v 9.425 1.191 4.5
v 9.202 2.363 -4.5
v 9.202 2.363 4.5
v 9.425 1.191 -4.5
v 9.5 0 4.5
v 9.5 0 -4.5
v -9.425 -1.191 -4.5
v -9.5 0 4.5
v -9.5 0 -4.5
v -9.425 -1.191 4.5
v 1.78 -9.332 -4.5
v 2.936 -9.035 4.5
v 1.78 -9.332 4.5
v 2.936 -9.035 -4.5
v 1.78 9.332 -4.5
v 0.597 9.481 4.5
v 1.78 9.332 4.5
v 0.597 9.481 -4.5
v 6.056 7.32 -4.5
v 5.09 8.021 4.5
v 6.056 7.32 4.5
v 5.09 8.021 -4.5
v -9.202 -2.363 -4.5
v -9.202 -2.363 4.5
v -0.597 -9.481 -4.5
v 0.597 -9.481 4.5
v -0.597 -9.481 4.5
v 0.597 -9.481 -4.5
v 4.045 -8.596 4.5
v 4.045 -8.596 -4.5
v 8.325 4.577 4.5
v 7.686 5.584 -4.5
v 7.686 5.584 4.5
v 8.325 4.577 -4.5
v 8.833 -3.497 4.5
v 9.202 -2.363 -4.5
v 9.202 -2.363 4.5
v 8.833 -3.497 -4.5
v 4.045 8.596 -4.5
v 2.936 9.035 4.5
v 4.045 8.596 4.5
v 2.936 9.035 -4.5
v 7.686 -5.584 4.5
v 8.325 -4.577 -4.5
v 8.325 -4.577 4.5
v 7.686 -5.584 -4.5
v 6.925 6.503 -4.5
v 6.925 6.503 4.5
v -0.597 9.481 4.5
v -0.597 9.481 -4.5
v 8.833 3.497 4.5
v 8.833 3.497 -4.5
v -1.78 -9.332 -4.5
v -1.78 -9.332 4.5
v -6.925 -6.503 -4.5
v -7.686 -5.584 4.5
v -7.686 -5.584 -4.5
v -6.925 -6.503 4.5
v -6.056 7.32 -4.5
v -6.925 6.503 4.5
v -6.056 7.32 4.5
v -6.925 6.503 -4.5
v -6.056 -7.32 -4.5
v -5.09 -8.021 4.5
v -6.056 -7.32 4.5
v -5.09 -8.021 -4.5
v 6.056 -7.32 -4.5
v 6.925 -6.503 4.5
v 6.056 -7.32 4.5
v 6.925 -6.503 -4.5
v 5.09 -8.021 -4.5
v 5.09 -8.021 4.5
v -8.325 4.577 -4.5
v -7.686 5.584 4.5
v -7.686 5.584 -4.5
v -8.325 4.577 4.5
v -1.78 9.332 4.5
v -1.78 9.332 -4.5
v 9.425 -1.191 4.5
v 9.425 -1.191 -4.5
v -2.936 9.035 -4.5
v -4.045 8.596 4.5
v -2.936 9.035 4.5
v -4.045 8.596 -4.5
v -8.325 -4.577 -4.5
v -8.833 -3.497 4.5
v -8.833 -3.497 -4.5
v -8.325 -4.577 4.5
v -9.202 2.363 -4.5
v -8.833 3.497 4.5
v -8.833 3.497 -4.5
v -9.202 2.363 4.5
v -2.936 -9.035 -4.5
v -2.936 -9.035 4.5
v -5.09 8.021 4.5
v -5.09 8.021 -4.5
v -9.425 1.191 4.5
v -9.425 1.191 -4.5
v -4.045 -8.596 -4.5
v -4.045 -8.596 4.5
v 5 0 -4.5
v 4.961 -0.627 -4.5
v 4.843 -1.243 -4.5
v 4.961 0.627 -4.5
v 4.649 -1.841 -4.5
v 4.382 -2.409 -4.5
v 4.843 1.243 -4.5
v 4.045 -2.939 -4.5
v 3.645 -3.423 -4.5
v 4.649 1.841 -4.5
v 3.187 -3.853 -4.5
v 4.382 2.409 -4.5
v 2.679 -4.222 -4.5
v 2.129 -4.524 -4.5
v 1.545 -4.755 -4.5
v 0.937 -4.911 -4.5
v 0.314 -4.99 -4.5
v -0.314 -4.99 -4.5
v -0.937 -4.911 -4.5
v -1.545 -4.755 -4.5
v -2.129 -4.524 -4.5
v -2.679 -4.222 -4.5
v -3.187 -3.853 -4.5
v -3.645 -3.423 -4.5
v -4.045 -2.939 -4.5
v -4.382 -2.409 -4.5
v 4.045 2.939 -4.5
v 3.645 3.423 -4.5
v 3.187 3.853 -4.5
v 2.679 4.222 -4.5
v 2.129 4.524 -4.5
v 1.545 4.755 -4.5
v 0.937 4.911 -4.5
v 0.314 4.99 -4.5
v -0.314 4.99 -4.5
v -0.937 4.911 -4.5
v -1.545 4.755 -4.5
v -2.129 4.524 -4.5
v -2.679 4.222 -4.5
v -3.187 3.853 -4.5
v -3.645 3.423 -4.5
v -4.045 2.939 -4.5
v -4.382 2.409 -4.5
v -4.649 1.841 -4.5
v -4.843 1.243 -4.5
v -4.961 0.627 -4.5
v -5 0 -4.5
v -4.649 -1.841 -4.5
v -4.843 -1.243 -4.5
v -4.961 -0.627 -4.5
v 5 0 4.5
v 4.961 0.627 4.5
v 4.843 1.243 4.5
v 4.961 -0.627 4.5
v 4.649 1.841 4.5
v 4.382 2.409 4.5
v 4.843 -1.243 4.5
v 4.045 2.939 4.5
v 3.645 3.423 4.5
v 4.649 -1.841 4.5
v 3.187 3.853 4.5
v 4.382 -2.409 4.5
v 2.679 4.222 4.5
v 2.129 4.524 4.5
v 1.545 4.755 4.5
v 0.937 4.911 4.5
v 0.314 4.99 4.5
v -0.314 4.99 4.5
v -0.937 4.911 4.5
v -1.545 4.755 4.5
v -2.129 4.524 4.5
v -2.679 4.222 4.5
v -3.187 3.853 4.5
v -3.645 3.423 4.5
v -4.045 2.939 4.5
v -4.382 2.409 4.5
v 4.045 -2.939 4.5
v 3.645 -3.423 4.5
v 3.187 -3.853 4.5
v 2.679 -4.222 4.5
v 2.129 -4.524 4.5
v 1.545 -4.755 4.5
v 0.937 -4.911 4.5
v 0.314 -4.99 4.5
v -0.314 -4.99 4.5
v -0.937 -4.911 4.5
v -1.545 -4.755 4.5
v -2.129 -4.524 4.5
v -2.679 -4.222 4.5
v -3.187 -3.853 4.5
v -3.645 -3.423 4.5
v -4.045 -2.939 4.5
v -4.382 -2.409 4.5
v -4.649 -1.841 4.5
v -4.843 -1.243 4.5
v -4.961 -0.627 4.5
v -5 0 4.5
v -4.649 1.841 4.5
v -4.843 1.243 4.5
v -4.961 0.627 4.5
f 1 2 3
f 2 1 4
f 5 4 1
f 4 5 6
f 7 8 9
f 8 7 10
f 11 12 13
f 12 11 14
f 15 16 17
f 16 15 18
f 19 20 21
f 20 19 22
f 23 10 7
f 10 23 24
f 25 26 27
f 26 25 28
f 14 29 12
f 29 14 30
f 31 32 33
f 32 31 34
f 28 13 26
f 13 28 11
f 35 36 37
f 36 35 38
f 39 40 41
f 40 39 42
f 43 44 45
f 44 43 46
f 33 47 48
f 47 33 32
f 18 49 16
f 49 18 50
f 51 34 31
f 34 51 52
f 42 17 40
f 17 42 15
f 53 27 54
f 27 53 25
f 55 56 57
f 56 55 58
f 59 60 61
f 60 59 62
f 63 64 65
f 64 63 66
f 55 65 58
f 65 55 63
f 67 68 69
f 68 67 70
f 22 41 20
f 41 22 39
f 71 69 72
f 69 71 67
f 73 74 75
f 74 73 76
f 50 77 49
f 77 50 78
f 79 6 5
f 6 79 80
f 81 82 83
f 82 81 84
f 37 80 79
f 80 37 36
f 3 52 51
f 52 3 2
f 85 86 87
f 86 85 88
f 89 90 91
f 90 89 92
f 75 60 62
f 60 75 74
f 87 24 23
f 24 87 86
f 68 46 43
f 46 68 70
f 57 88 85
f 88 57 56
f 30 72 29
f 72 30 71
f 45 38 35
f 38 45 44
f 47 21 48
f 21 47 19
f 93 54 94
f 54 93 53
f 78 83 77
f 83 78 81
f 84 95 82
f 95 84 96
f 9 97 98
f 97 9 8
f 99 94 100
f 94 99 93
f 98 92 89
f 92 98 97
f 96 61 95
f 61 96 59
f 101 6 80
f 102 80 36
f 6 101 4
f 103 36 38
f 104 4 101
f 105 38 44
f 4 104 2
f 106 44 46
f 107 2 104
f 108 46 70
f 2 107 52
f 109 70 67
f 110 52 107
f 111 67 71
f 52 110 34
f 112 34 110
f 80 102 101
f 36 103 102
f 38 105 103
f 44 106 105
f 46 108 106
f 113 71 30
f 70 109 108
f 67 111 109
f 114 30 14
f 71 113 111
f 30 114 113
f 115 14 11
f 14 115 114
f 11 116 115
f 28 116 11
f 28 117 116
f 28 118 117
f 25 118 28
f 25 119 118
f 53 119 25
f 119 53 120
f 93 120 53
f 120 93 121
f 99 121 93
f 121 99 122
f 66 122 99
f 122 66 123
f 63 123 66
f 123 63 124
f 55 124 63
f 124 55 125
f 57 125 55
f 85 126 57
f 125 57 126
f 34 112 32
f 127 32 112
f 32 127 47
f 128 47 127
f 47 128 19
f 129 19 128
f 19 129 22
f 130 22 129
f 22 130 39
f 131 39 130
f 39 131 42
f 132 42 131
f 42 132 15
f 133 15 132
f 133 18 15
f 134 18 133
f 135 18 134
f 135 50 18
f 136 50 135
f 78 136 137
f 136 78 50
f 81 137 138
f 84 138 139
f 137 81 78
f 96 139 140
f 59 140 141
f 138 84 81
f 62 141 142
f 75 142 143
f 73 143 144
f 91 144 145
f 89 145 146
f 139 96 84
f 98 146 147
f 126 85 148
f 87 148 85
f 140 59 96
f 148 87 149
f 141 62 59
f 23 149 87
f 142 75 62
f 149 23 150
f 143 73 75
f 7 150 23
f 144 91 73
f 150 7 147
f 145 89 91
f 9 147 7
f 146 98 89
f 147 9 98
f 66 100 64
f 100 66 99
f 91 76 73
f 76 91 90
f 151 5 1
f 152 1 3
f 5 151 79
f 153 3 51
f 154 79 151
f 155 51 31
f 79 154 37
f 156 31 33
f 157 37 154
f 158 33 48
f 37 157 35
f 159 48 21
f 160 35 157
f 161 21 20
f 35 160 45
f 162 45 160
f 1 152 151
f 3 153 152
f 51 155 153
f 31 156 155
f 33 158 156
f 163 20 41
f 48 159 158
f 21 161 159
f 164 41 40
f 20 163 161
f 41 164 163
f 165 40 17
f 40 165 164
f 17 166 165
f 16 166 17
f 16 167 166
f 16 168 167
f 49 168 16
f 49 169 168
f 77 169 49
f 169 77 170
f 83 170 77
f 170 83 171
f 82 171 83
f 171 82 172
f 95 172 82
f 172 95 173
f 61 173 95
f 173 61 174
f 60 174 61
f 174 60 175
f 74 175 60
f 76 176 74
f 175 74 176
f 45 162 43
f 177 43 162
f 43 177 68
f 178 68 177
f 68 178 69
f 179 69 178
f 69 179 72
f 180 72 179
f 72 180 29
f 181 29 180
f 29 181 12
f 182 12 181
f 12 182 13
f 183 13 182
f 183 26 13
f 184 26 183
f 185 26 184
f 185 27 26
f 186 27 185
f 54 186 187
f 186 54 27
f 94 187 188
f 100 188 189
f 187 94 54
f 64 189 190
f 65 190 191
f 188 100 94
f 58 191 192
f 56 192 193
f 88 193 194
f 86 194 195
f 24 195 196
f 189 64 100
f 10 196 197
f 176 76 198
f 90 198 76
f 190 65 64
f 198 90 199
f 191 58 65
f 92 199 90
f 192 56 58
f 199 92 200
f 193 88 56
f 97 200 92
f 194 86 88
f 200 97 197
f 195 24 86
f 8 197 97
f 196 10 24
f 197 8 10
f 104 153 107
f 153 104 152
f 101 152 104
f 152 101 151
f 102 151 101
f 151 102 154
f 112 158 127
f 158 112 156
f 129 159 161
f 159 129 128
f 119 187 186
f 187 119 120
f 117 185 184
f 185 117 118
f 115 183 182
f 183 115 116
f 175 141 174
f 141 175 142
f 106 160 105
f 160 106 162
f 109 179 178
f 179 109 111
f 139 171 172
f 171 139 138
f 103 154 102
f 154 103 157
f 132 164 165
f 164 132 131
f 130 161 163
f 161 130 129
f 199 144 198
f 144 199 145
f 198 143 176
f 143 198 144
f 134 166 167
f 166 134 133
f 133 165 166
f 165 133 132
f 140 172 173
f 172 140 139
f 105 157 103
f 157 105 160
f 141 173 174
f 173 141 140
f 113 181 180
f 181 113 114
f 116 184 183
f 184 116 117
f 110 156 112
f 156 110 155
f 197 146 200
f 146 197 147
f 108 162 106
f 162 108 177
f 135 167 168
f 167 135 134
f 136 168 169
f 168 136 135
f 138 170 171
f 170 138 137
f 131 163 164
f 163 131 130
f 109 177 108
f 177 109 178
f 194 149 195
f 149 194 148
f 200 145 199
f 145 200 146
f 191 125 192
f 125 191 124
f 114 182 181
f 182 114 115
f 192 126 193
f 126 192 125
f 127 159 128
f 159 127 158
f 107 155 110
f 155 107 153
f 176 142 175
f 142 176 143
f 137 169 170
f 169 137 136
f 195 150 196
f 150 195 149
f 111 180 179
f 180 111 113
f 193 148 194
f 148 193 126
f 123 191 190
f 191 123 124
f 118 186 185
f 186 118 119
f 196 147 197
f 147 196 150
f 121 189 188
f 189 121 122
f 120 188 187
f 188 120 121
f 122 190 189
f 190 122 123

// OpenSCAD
$fn = 50;


difference() {
	union() {
		translate(v = [0, 0, -4.5000000000]) {
			cylinder(h = 9, r = 9.5000000000);
		}
	}
	union() {
		translate(v = [0, 0, -100.0000000000]) {
			cylinder(h = 200, r = 5.0000000000);
		}
	}
}
